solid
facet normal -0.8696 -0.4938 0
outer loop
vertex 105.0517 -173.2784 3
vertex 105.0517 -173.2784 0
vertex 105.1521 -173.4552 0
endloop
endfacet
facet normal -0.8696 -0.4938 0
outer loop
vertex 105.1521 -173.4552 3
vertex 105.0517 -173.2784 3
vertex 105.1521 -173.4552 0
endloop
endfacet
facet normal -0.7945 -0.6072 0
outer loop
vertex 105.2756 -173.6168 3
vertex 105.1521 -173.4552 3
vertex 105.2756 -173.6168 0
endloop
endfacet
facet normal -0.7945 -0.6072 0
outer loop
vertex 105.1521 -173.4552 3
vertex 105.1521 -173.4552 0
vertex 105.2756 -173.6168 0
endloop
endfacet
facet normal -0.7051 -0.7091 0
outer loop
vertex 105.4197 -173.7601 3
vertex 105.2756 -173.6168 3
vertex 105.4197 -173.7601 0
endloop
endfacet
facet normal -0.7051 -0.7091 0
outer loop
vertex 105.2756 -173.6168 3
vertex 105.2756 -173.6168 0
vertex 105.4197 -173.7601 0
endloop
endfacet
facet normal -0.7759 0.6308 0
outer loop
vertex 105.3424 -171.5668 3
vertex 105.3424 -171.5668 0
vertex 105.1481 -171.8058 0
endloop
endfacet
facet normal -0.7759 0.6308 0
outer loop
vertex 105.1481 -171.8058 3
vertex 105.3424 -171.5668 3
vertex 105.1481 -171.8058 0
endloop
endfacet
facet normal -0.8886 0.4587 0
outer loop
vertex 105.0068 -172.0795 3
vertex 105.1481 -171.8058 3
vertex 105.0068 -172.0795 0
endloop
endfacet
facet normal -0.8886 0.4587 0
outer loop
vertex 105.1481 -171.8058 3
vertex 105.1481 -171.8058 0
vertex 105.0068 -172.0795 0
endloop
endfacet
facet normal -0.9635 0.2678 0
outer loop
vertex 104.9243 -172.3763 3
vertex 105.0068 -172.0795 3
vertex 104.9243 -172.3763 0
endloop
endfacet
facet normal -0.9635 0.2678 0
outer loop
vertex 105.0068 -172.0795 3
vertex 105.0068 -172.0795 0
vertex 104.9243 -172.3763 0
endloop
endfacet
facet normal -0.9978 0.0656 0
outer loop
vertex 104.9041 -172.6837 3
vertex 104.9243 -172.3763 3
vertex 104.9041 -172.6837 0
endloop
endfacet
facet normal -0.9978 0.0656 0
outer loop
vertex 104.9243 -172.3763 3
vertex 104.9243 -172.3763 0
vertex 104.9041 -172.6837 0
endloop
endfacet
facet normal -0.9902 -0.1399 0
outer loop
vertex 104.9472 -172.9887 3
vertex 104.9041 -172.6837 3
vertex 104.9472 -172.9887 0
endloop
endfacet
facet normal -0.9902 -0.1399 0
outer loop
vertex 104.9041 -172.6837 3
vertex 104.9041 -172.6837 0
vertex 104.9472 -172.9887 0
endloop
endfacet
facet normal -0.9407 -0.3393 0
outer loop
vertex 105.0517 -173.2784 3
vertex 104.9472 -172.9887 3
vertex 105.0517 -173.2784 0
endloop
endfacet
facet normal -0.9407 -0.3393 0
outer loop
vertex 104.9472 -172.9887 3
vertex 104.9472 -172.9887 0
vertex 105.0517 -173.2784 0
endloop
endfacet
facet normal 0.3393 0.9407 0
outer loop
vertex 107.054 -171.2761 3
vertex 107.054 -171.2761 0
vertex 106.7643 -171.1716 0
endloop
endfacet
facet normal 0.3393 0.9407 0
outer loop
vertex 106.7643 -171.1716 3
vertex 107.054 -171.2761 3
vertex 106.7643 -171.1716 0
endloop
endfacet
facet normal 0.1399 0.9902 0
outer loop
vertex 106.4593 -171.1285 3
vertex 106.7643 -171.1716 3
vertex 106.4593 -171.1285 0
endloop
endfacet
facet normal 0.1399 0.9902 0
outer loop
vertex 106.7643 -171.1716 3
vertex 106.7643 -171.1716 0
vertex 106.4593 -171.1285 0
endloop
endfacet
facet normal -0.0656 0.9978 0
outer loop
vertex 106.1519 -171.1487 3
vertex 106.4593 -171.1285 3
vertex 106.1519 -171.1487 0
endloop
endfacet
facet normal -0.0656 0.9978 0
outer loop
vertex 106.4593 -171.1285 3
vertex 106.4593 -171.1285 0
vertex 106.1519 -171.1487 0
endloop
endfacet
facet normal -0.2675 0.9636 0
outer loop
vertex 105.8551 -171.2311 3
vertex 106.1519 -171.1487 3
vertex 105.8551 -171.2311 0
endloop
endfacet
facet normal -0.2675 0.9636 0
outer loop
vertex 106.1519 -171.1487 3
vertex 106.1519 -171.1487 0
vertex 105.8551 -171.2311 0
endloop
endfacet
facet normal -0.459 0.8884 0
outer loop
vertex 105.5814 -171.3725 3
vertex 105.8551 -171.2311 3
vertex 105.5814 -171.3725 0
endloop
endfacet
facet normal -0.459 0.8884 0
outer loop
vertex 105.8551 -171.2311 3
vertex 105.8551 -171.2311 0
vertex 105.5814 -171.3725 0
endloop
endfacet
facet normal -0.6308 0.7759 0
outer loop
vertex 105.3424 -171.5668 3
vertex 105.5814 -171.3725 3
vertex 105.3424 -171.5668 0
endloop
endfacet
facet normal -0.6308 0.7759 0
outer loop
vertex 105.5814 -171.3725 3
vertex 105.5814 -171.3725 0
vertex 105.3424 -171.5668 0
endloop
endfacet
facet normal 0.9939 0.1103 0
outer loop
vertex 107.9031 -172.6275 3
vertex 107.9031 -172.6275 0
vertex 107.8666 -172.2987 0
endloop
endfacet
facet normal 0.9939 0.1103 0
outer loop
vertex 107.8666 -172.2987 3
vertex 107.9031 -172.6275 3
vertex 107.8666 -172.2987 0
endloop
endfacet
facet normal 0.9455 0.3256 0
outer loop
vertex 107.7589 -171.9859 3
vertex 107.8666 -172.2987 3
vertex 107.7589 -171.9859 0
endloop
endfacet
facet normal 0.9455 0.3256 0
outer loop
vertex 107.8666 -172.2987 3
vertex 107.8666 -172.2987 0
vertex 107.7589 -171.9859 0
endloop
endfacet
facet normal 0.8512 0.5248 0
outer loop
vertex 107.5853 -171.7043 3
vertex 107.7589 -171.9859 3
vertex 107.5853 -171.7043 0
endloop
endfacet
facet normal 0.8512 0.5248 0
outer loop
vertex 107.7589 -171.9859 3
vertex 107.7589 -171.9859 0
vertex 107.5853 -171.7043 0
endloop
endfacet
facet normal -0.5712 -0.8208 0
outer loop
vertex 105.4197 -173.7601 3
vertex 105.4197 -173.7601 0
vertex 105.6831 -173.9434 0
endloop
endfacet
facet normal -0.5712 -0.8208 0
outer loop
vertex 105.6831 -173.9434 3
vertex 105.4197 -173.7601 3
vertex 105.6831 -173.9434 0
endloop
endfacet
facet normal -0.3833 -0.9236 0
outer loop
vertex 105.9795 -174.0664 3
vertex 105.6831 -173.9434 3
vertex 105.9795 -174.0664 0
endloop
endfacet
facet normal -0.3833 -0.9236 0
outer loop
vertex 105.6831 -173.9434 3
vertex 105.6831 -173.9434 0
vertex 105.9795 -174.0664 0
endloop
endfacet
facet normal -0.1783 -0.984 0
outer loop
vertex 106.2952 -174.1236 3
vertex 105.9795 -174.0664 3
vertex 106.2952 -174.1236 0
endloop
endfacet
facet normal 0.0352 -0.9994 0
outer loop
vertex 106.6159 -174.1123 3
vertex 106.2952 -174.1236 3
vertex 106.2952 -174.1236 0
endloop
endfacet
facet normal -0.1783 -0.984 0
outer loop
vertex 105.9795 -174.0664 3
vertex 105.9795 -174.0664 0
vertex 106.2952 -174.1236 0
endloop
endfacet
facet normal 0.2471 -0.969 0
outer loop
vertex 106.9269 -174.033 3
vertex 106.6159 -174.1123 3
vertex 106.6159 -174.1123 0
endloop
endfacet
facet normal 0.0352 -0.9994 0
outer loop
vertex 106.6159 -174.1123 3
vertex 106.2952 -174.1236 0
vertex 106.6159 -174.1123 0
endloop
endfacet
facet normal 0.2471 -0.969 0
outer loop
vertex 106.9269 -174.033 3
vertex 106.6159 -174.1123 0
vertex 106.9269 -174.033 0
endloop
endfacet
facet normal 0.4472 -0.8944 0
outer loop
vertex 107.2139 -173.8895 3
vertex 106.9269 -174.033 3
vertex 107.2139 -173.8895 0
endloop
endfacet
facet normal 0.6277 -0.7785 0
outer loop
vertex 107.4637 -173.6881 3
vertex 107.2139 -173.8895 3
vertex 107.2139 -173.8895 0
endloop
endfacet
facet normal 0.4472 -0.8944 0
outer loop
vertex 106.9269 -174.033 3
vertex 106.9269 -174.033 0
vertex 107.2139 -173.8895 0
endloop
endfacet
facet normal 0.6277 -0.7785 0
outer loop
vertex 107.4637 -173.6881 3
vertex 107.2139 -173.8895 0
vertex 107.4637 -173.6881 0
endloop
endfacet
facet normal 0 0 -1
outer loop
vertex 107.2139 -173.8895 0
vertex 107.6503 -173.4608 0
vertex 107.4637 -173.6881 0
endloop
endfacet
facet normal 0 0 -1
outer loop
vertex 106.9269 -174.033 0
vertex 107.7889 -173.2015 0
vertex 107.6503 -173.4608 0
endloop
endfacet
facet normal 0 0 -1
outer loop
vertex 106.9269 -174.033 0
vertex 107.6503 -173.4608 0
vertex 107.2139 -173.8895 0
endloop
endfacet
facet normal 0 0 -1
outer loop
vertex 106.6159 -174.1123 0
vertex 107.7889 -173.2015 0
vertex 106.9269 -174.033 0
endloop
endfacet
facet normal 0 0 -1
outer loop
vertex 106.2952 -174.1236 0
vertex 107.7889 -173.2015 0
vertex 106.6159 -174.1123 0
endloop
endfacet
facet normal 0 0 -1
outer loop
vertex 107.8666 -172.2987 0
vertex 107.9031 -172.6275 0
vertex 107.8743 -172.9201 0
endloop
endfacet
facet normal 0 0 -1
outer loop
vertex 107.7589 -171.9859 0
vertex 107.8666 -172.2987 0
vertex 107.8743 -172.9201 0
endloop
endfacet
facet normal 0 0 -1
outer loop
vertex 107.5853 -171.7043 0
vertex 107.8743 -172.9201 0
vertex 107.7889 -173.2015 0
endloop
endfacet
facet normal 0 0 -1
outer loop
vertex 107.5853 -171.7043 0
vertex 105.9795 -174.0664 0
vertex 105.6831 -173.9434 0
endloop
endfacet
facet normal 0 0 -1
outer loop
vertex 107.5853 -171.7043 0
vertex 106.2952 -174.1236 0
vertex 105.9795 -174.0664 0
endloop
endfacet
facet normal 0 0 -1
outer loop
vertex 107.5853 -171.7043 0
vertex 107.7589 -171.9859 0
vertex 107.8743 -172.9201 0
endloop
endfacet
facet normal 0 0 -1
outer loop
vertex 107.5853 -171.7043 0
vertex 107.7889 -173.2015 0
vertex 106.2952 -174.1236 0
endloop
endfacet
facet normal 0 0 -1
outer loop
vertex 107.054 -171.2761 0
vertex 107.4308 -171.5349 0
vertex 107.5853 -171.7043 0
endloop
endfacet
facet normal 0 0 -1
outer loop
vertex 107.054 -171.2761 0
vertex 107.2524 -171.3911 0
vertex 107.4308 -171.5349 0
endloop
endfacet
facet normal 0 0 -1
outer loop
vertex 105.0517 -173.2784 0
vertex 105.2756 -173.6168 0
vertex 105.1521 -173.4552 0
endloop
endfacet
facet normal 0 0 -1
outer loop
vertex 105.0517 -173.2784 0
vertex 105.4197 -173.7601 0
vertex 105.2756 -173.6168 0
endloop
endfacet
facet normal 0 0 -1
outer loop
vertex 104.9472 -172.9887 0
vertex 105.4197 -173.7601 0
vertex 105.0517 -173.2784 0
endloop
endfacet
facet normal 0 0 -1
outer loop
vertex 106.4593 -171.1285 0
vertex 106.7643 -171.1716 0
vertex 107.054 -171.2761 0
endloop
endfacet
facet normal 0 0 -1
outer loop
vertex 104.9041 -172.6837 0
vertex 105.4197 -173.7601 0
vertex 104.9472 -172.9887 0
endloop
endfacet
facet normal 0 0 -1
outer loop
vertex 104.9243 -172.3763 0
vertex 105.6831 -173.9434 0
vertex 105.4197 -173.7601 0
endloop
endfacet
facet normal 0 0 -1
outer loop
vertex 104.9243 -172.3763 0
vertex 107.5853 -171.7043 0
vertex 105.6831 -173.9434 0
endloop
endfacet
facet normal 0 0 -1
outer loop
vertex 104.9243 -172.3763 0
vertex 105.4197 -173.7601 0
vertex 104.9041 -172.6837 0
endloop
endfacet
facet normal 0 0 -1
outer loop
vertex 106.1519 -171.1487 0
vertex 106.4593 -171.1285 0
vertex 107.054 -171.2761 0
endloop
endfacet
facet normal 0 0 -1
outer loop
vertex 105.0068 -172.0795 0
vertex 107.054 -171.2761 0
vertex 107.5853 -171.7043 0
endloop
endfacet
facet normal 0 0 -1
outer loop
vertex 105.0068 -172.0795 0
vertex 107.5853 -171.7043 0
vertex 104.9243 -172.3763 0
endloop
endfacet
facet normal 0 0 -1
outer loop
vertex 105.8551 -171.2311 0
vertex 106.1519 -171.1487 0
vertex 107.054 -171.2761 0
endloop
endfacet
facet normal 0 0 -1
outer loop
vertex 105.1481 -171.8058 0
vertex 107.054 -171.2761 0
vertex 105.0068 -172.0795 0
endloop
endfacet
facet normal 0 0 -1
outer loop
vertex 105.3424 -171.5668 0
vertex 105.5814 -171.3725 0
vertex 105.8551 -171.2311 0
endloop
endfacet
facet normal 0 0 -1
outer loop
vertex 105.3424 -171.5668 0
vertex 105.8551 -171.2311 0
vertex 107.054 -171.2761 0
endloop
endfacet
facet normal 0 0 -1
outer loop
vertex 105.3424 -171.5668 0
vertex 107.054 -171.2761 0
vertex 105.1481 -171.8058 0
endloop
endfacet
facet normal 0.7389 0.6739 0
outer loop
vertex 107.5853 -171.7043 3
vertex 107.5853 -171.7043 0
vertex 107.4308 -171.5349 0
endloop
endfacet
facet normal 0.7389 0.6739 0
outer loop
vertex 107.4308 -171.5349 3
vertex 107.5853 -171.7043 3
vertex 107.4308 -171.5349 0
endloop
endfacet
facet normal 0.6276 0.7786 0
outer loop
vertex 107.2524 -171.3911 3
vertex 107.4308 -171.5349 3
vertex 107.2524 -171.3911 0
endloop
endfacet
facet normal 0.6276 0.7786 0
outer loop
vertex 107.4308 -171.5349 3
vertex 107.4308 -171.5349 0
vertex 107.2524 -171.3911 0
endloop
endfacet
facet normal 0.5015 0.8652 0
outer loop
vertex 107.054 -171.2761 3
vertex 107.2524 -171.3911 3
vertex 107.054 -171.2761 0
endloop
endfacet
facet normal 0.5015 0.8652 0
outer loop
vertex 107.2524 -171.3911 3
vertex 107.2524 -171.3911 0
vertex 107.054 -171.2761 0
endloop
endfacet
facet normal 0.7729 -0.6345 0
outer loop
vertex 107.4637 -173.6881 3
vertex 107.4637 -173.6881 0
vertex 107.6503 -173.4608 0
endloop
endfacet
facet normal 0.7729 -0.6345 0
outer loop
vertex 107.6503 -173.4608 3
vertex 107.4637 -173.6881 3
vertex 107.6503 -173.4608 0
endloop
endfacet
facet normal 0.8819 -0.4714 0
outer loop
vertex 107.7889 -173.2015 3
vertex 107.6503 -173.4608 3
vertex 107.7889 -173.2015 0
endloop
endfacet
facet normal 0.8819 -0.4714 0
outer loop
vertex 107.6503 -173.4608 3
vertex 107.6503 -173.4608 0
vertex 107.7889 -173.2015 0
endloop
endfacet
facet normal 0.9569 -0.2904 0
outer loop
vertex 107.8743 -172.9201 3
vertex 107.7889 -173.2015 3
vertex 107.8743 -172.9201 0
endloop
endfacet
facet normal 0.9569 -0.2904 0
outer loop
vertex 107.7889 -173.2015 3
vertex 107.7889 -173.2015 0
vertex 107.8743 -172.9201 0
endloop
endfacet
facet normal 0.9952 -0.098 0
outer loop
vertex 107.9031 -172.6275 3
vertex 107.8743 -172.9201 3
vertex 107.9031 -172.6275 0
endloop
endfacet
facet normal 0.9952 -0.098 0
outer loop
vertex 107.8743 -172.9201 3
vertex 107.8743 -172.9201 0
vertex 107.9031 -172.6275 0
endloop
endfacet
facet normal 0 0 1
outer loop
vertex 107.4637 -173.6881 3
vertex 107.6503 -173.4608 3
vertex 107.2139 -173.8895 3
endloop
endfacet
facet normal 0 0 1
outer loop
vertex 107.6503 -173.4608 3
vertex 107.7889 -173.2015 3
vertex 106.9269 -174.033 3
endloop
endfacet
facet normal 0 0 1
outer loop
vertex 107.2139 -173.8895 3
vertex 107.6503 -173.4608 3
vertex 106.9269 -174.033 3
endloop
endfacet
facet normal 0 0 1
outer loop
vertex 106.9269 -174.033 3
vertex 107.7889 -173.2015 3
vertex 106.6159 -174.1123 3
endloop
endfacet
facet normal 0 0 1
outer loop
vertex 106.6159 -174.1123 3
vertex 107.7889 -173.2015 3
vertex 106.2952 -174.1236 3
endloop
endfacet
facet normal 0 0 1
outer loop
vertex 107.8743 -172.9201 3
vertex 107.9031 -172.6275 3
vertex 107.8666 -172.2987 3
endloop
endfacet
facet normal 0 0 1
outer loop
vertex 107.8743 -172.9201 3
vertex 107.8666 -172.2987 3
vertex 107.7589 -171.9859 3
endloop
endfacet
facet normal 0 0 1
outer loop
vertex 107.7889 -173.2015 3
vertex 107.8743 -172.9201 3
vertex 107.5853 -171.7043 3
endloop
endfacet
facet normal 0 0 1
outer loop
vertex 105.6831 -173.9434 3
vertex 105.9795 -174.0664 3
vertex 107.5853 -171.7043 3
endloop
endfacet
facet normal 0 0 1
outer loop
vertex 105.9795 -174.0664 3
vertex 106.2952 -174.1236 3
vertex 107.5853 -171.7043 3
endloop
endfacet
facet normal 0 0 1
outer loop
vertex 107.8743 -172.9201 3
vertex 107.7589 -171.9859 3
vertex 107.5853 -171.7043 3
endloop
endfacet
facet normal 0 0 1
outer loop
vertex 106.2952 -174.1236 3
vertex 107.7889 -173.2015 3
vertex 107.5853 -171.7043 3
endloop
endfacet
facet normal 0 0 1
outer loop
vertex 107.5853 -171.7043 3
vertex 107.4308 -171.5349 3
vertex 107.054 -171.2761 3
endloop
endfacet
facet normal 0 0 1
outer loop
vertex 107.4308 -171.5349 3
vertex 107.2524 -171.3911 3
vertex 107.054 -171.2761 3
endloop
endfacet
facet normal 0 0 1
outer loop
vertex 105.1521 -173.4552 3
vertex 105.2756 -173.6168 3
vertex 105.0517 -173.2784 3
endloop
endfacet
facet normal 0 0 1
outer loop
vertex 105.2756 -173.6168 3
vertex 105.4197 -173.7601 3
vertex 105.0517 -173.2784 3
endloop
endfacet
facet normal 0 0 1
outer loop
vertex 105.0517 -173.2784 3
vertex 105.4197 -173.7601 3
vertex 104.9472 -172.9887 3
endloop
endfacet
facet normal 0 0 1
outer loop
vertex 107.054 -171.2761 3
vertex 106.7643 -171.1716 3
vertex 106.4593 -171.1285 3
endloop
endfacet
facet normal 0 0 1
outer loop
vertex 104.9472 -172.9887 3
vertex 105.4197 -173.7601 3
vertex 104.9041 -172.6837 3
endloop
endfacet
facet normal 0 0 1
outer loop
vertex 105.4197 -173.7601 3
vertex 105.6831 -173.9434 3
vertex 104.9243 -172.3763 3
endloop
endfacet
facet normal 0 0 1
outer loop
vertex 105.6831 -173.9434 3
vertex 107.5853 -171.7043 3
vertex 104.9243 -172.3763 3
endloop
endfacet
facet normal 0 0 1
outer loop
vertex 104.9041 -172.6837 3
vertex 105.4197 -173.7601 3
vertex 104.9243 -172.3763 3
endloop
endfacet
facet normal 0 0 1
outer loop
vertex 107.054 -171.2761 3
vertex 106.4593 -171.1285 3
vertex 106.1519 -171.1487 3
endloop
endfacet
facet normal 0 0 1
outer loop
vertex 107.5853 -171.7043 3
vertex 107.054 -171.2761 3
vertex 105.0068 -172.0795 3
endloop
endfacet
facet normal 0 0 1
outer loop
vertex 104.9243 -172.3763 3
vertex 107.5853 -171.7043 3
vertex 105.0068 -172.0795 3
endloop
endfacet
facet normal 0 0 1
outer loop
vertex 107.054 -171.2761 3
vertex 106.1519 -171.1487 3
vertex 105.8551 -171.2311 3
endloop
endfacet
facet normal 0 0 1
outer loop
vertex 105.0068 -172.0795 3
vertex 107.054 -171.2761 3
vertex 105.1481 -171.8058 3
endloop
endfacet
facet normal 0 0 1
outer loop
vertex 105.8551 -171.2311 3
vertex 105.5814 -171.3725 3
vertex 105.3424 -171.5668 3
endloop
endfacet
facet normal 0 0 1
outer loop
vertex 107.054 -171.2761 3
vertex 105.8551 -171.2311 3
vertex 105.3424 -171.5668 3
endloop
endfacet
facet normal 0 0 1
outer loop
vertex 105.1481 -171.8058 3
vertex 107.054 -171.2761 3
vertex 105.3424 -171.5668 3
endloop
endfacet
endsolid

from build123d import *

# Parameters (mm, degrees)
F1_DEPTH = 3


with BuildPart() as f1:
    # F0 (on Top) → F1 (new body)
    with BuildSketch(Plane.XY):
        with BuildLine():
            add(Edge.make_bspline(
                [(106.5138728984, -172.7382705017), (106.8738569817, -172.3965421057), (107.2310443428, -172.0518793198), (107.5853167864, -171.7042677973)],
                knots=[422.4622501574, 422.4622501574, 422.4622501574, 422.4622501574, 423.9506529513, 423.9506529513, 423.9506529513, 423.9506529513], degree=3))
            Line((106.5138728987, -172.7382705019), (107.4637404903, -173.6881380935))
            ThreePointArc((107.4637404903, -173.6881380935), (107.7888996172, -173.2015030703), (107.9030803185, -172.6274779217))
            ThreePointArc((107.9030803185, -172.6274779217), (107.8214164391, -172.1392949141), (107.5853167866, -171.7042677976))
        make_face()
        with BuildLine():
            Line((107.0540405494, -171.2760894588), (106.0528662025, -172.2772638057))
            Line((106.0528662025, -172.2772638057), (106.5138728987, -172.7382705019))
            add(Edge.make_bspline(
                [(106.5138728984, -172.7382705017), (106.8738569817, -172.3965421057), (107.2310443428, -172.0518793198), (107.5853167864, -171.7042677973)],
                knots=[422.4622501574, 422.4622501574, 422.4622501574, 422.4622501574, 423.9506529513, 423.9506529513, 423.9506529513, 423.9506529513], degree=3))
            ThreePointArc((107.5853167866, -171.7042677976), (107.3443489872, -171.459568125), (107.0540405494, -171.2760894588))
        make_face()
        with BuildLine():
            ThreePointArc((107.0540405494, -171.2760894588), (106.1518946397, -171.1486588811), (105.3424201467, -171.5668177499))
            Line((105.3424201467, -171.5668177499), (106.0528662025, -172.2772638057))
            Line((106.0528662025, -172.2772638057), (107.0540405494, -171.2760894588))
        make_face()
        with BuildLine():
            Line((106.0528662025, -172.2772638057), (105.3424201467, -171.5668177499))
            ThreePointArc((105.3424201467, -171.5668177499), (104.9242612779, -172.376292243), (105.0516918555, -173.2784381526))
            Line((105.0516918555, -173.2784381526), (106.0528662025, -172.2772638057))
        make_face()
        with BuildLine():
            ThreePointArc((105.0516918555, -173.2784381526), (105.2111018752, -173.5380751932), (105.4196865403, -173.7601458682))
            add(Edge.make_bspline(
                [(105.4196865401, -173.760145868), (105.7871624576, -173.4224774148), (106.1519312885, -173.0818571533), (106.5138728984, -172.7382705017)],
                knots=[420.9657537049, 420.9657537049, 420.9657537049, 420.9657537049, 422.4622501574, 422.4622501574, 422.4622501574, 422.4622501574], degree=3))
            Line((106.5138728987, -172.7382705019), (106.0528662025, -172.2772638057))
            Line((106.0528662025, -172.2772638057), (105.0516918555, -173.2784381526))
        make_face()
        with BuildLine():
            add(Edge.make_bspline(
                [(105.4196865401, -173.760145868), (105.7871624576, -173.4224774148), (106.1519312885, -173.0818571533), (106.5138728984, -172.7382705017)],
                knots=[420.9657537049, 420.9657537049, 420.9657537049, 420.9657537049, 422.4622501574, 422.4622501574, 422.4622501574, 422.4622501574], degree=3))
            ThreePointArc((105.4196865403, -173.7601458682), (106.4558894446, -174.1265480322), (107.4637404903, -173.6881380935))
            Line((107.4637404903, -173.6881380935), (106.5138728987, -172.7382705019))
        make_face()
    extrude(amount=F1_DEPTH)


solid = f1.part
